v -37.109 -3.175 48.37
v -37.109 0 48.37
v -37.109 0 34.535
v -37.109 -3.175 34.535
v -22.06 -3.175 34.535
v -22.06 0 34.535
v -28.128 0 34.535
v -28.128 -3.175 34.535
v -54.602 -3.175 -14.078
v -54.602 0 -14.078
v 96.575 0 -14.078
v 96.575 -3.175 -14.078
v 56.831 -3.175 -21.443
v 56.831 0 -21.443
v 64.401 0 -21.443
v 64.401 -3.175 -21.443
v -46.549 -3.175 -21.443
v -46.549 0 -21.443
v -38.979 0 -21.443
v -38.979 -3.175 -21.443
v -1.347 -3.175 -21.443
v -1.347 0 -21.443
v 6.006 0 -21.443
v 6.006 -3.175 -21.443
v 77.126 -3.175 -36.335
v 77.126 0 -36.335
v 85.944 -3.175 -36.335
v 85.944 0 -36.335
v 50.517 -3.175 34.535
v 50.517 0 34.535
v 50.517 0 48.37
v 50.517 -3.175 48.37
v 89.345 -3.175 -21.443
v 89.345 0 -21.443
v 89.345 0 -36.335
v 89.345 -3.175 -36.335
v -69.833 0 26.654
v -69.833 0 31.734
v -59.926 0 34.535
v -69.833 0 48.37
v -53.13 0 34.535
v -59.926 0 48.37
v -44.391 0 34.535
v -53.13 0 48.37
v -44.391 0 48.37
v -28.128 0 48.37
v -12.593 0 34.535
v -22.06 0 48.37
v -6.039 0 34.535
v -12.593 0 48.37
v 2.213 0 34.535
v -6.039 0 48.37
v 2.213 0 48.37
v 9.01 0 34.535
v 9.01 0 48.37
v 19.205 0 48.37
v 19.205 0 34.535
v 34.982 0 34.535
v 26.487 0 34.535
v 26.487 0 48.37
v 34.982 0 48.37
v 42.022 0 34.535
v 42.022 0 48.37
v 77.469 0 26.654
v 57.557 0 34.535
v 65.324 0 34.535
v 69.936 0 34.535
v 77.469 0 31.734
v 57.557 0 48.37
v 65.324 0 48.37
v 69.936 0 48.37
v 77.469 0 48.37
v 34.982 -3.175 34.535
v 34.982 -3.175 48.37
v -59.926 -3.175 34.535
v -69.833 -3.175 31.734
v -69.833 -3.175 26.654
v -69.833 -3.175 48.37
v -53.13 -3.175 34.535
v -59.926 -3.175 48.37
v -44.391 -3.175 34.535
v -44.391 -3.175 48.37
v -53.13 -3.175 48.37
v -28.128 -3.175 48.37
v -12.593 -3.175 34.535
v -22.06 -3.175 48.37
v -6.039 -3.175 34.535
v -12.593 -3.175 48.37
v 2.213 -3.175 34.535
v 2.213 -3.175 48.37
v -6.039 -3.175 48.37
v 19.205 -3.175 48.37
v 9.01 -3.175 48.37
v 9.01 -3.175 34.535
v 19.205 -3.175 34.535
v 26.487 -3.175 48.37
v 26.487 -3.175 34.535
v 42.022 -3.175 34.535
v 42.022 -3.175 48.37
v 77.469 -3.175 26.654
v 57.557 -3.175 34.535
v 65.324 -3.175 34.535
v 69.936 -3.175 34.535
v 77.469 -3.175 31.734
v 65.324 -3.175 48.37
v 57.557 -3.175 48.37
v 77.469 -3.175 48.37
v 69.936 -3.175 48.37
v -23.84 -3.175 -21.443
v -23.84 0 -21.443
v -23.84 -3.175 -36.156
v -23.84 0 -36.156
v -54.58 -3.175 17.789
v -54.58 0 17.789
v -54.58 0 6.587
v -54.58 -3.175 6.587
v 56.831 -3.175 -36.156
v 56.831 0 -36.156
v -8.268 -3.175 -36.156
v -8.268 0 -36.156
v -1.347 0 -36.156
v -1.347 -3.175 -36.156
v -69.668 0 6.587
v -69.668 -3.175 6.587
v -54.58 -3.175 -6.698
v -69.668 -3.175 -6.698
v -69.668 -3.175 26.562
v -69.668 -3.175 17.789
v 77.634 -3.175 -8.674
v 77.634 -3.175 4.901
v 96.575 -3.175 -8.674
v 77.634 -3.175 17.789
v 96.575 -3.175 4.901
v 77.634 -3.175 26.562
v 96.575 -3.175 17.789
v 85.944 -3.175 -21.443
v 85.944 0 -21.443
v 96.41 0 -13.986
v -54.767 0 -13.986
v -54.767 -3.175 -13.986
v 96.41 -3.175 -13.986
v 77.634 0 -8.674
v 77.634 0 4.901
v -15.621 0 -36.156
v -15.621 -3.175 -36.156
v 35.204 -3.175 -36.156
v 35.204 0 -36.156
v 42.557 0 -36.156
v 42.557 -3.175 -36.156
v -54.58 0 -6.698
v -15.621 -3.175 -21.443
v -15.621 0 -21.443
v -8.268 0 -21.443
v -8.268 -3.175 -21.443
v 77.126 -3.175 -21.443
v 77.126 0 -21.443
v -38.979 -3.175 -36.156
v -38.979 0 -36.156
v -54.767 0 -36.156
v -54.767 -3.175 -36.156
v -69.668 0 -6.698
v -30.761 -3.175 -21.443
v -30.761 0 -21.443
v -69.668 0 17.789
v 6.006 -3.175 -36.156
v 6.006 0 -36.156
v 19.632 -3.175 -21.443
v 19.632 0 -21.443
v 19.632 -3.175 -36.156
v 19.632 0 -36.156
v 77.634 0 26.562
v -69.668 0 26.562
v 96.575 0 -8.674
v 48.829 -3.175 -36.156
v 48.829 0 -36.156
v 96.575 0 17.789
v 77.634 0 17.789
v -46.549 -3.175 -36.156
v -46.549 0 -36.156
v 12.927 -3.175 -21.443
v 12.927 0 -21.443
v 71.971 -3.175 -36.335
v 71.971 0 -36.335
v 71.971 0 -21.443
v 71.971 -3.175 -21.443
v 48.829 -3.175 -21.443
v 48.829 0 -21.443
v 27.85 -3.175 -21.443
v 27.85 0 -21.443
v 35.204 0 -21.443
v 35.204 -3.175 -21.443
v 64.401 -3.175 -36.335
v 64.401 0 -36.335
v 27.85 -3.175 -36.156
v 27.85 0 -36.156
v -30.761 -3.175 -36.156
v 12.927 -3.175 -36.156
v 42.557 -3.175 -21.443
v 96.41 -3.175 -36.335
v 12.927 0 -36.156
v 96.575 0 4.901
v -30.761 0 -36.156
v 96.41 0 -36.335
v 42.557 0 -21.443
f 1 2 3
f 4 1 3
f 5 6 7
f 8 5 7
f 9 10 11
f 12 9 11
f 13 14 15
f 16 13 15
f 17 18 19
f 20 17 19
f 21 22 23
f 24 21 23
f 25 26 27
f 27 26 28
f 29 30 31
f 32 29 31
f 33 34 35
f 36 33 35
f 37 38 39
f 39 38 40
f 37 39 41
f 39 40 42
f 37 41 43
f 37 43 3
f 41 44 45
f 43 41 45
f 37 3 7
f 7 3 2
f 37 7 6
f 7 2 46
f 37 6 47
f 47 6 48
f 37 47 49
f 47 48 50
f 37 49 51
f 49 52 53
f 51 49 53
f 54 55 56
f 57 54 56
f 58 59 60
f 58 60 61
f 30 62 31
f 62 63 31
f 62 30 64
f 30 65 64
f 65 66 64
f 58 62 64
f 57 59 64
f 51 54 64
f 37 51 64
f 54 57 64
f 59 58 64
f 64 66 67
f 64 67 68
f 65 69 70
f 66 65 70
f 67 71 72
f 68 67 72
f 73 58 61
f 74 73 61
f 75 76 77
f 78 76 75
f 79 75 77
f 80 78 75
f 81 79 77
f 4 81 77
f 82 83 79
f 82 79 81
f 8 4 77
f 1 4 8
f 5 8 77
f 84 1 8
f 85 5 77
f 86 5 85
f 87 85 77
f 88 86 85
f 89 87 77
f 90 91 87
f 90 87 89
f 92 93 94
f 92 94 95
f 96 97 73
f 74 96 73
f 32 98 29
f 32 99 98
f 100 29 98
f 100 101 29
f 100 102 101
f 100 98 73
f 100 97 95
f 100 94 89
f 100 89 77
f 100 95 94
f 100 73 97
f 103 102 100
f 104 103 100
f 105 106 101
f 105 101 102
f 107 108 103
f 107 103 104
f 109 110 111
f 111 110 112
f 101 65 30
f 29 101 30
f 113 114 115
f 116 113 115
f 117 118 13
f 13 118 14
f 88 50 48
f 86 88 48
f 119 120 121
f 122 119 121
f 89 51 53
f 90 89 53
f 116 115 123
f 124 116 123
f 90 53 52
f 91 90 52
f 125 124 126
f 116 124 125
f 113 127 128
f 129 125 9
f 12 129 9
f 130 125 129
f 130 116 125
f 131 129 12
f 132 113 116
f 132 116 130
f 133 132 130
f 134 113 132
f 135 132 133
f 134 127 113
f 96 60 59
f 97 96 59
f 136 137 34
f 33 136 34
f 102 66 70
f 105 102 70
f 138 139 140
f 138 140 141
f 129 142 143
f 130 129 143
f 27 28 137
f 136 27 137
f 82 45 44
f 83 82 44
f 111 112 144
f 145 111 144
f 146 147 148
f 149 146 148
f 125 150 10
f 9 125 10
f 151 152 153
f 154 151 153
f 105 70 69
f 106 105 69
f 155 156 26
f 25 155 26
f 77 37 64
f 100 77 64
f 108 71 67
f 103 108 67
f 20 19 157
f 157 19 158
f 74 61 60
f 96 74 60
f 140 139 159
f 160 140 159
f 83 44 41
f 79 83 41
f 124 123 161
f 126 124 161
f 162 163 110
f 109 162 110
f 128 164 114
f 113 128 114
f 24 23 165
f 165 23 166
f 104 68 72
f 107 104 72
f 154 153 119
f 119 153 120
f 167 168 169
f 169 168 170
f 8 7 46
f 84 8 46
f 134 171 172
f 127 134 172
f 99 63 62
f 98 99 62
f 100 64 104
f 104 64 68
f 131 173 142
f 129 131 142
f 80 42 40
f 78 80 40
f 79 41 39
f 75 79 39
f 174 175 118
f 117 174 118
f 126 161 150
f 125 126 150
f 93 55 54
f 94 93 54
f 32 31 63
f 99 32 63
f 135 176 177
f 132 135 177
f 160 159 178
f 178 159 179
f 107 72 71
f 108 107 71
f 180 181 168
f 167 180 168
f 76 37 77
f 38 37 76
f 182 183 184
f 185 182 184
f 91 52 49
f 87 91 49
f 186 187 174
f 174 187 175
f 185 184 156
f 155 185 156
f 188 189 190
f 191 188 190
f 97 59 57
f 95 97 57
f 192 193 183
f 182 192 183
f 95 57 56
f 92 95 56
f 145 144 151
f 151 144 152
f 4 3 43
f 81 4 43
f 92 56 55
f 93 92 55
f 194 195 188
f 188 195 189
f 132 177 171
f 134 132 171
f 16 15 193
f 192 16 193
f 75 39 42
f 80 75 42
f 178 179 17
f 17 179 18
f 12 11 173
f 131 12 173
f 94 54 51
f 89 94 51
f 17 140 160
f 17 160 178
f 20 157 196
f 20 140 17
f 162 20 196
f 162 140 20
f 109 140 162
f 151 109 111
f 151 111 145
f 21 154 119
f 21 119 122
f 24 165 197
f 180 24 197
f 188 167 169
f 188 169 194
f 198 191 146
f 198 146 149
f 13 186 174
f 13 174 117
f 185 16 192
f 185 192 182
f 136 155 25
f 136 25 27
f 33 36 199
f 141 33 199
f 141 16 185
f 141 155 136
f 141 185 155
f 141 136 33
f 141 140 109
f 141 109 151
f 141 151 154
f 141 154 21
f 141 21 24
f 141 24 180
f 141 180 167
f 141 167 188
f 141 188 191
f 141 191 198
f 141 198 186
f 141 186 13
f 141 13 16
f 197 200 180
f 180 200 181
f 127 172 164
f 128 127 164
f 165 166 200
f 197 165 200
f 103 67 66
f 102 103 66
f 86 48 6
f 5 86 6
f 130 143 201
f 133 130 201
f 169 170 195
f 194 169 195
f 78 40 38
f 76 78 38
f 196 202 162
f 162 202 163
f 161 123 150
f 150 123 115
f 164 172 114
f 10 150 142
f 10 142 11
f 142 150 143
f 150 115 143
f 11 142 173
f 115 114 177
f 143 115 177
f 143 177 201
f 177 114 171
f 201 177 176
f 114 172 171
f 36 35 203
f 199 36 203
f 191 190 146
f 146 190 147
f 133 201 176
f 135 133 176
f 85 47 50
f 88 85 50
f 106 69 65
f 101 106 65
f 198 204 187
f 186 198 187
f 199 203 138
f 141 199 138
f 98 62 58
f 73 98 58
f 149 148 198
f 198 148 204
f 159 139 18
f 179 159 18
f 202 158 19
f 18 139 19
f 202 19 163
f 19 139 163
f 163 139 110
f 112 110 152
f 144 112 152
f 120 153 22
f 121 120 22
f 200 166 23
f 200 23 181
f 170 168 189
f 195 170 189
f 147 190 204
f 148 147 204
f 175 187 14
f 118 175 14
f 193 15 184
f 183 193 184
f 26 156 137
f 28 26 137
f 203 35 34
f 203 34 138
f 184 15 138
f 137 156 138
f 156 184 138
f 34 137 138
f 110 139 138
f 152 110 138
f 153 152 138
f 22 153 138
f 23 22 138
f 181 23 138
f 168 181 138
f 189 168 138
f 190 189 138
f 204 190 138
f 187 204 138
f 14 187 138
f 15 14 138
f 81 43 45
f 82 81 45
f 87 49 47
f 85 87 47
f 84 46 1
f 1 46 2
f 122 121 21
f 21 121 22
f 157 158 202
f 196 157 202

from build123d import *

# Parameters (mm, degrees)
F0_W     = 147.301361
F0_H     = 5.08
F0_W_2   = 151.177182
F1_DEPTH = 3.175
F3_DEPTH = 3.175


with BuildPart() as f1:
    # F0 (on Front) → F1 (new body)
    with BuildSketch(Plane.XZ):
        Polygon((-69.832792, 48.37012), (-69.832792, 31.733985), (77.468569, 31.733985), (77.468569, 48.37012), (69.936005, 48.37012), (69.936005, 34.535155), (65.324081, 34.535155), (65.324081, 48.37012), (57.556612, 48.37012), (57.556612, 34.535155), (50.517352, 34.535155), (50.517352, 48.37012), (42.021689, 48.37012), (42.021689, 34.535155), (34.982426, 34.535155), (34.982426, 48.37012), (26.486765, 48.37012), (26.486765, 34.535155), (19.204767, 34.535155), (19.204767, 48.37012), (9.009972, 48.37012), (9.009972, 34.535155), (2.213441, 34.535155), (2.213441, 48.37012), (-6.039487, 48.37012), (-6.039487, 34.535155), (-12.593285, 34.535155), (-12.593285, 48.37012), (-22.059879, 48.37012), (-22.059879, 34.535155), (-28.128209, 34.535155), (-28.128209, 48.37012), (-37.10934, 48.37012), (-37.10934, 34.535155), (-44.391333, 34.535155), (-44.391333, 48.37012), (-53.129731, 48.37012), (-53.129731, 34.535155), (-59.926259, 34.535155), (-59.926259, 48.37012), align=None)
        with Locations((3.817889, 29.193985)):
            Rectangle(F0_W, F0_H)
        with Locations((20.821245, -16.526015)):
            Rectangle(F0_W_2, F0_H)
        Polygon((96.409836, -19.066015), (-54.767346, -19.066015), (-54.767346, -36.155596), (-46.548847, -36.155596), (-46.548847, -21.442869), (-38.979172, -21.442869), (-38.979172, -36.155596), (-30.760671, -36.155596), (-30.760671, -21.442869), (-23.839827, -21.442869), (-23.839827, -36.155596), (-15.621325, -36.155596), (-15.621325, -21.442869), (-8.267927, -21.442869), (-8.267927, -36.155596), (-1.347084, -36.155596), (-1.347084, -21.442869), (6.006312, -21.442869), (6.006312, -36.155596), (12.927156, -36.155596), (12.927156, -21.442869), (19.631724, -21.442869), (19.631724, -36.155596), (27.850224, -36.155596), (27.850224, -21.442869), (35.203622, -21.442869), (35.203622, -36.155596), (42.557018, -36.155596), (42.557018, -21.442869), (48.829032, -21.442869), (48.829032, -36.155596), (56.83126, -36.155596), (56.83126, -21.442869), (64.400932, -21.442869), (64.400932, -36.335392), (71.970609, -36.335392), (71.970609, -21.442869), (77.126344, -21.442869), (77.126344, -36.335392), (85.943542, -36.335392), (85.943542, -21.442869), (89.344725, -21.442869), (89.344725, -36.335392), (96.409836, -36.335392), align=None)
    extrude(amount=F1_DEPTH)


with BuildPart() as f3:
    # F2 (on Front) → F3 (new body)
    with BuildSketch(Plane.XZ):
        Polygon((77.633658, 26.562235), (-69.667703, 26.562235), (-69.667703, 17.78922), (-54.580103, 17.78922), (-54.580103, 6.586777), (-69.667703, 6.586777), (-69.667703, -6.698481), (-54.580103, -6.698481), (-54.602256, -14.077765), (96.574925, -14.077765), (96.574925, -8.673837), (77.633658, -8.673837), (77.633658, 4.900949), (96.574925, 4.900949), (96.574925, 17.78922), (77.633658, 17.78922), align=None)
    extrude(amount=F3_DEPTH)


solid = Compound([f1.part, f3.part])
